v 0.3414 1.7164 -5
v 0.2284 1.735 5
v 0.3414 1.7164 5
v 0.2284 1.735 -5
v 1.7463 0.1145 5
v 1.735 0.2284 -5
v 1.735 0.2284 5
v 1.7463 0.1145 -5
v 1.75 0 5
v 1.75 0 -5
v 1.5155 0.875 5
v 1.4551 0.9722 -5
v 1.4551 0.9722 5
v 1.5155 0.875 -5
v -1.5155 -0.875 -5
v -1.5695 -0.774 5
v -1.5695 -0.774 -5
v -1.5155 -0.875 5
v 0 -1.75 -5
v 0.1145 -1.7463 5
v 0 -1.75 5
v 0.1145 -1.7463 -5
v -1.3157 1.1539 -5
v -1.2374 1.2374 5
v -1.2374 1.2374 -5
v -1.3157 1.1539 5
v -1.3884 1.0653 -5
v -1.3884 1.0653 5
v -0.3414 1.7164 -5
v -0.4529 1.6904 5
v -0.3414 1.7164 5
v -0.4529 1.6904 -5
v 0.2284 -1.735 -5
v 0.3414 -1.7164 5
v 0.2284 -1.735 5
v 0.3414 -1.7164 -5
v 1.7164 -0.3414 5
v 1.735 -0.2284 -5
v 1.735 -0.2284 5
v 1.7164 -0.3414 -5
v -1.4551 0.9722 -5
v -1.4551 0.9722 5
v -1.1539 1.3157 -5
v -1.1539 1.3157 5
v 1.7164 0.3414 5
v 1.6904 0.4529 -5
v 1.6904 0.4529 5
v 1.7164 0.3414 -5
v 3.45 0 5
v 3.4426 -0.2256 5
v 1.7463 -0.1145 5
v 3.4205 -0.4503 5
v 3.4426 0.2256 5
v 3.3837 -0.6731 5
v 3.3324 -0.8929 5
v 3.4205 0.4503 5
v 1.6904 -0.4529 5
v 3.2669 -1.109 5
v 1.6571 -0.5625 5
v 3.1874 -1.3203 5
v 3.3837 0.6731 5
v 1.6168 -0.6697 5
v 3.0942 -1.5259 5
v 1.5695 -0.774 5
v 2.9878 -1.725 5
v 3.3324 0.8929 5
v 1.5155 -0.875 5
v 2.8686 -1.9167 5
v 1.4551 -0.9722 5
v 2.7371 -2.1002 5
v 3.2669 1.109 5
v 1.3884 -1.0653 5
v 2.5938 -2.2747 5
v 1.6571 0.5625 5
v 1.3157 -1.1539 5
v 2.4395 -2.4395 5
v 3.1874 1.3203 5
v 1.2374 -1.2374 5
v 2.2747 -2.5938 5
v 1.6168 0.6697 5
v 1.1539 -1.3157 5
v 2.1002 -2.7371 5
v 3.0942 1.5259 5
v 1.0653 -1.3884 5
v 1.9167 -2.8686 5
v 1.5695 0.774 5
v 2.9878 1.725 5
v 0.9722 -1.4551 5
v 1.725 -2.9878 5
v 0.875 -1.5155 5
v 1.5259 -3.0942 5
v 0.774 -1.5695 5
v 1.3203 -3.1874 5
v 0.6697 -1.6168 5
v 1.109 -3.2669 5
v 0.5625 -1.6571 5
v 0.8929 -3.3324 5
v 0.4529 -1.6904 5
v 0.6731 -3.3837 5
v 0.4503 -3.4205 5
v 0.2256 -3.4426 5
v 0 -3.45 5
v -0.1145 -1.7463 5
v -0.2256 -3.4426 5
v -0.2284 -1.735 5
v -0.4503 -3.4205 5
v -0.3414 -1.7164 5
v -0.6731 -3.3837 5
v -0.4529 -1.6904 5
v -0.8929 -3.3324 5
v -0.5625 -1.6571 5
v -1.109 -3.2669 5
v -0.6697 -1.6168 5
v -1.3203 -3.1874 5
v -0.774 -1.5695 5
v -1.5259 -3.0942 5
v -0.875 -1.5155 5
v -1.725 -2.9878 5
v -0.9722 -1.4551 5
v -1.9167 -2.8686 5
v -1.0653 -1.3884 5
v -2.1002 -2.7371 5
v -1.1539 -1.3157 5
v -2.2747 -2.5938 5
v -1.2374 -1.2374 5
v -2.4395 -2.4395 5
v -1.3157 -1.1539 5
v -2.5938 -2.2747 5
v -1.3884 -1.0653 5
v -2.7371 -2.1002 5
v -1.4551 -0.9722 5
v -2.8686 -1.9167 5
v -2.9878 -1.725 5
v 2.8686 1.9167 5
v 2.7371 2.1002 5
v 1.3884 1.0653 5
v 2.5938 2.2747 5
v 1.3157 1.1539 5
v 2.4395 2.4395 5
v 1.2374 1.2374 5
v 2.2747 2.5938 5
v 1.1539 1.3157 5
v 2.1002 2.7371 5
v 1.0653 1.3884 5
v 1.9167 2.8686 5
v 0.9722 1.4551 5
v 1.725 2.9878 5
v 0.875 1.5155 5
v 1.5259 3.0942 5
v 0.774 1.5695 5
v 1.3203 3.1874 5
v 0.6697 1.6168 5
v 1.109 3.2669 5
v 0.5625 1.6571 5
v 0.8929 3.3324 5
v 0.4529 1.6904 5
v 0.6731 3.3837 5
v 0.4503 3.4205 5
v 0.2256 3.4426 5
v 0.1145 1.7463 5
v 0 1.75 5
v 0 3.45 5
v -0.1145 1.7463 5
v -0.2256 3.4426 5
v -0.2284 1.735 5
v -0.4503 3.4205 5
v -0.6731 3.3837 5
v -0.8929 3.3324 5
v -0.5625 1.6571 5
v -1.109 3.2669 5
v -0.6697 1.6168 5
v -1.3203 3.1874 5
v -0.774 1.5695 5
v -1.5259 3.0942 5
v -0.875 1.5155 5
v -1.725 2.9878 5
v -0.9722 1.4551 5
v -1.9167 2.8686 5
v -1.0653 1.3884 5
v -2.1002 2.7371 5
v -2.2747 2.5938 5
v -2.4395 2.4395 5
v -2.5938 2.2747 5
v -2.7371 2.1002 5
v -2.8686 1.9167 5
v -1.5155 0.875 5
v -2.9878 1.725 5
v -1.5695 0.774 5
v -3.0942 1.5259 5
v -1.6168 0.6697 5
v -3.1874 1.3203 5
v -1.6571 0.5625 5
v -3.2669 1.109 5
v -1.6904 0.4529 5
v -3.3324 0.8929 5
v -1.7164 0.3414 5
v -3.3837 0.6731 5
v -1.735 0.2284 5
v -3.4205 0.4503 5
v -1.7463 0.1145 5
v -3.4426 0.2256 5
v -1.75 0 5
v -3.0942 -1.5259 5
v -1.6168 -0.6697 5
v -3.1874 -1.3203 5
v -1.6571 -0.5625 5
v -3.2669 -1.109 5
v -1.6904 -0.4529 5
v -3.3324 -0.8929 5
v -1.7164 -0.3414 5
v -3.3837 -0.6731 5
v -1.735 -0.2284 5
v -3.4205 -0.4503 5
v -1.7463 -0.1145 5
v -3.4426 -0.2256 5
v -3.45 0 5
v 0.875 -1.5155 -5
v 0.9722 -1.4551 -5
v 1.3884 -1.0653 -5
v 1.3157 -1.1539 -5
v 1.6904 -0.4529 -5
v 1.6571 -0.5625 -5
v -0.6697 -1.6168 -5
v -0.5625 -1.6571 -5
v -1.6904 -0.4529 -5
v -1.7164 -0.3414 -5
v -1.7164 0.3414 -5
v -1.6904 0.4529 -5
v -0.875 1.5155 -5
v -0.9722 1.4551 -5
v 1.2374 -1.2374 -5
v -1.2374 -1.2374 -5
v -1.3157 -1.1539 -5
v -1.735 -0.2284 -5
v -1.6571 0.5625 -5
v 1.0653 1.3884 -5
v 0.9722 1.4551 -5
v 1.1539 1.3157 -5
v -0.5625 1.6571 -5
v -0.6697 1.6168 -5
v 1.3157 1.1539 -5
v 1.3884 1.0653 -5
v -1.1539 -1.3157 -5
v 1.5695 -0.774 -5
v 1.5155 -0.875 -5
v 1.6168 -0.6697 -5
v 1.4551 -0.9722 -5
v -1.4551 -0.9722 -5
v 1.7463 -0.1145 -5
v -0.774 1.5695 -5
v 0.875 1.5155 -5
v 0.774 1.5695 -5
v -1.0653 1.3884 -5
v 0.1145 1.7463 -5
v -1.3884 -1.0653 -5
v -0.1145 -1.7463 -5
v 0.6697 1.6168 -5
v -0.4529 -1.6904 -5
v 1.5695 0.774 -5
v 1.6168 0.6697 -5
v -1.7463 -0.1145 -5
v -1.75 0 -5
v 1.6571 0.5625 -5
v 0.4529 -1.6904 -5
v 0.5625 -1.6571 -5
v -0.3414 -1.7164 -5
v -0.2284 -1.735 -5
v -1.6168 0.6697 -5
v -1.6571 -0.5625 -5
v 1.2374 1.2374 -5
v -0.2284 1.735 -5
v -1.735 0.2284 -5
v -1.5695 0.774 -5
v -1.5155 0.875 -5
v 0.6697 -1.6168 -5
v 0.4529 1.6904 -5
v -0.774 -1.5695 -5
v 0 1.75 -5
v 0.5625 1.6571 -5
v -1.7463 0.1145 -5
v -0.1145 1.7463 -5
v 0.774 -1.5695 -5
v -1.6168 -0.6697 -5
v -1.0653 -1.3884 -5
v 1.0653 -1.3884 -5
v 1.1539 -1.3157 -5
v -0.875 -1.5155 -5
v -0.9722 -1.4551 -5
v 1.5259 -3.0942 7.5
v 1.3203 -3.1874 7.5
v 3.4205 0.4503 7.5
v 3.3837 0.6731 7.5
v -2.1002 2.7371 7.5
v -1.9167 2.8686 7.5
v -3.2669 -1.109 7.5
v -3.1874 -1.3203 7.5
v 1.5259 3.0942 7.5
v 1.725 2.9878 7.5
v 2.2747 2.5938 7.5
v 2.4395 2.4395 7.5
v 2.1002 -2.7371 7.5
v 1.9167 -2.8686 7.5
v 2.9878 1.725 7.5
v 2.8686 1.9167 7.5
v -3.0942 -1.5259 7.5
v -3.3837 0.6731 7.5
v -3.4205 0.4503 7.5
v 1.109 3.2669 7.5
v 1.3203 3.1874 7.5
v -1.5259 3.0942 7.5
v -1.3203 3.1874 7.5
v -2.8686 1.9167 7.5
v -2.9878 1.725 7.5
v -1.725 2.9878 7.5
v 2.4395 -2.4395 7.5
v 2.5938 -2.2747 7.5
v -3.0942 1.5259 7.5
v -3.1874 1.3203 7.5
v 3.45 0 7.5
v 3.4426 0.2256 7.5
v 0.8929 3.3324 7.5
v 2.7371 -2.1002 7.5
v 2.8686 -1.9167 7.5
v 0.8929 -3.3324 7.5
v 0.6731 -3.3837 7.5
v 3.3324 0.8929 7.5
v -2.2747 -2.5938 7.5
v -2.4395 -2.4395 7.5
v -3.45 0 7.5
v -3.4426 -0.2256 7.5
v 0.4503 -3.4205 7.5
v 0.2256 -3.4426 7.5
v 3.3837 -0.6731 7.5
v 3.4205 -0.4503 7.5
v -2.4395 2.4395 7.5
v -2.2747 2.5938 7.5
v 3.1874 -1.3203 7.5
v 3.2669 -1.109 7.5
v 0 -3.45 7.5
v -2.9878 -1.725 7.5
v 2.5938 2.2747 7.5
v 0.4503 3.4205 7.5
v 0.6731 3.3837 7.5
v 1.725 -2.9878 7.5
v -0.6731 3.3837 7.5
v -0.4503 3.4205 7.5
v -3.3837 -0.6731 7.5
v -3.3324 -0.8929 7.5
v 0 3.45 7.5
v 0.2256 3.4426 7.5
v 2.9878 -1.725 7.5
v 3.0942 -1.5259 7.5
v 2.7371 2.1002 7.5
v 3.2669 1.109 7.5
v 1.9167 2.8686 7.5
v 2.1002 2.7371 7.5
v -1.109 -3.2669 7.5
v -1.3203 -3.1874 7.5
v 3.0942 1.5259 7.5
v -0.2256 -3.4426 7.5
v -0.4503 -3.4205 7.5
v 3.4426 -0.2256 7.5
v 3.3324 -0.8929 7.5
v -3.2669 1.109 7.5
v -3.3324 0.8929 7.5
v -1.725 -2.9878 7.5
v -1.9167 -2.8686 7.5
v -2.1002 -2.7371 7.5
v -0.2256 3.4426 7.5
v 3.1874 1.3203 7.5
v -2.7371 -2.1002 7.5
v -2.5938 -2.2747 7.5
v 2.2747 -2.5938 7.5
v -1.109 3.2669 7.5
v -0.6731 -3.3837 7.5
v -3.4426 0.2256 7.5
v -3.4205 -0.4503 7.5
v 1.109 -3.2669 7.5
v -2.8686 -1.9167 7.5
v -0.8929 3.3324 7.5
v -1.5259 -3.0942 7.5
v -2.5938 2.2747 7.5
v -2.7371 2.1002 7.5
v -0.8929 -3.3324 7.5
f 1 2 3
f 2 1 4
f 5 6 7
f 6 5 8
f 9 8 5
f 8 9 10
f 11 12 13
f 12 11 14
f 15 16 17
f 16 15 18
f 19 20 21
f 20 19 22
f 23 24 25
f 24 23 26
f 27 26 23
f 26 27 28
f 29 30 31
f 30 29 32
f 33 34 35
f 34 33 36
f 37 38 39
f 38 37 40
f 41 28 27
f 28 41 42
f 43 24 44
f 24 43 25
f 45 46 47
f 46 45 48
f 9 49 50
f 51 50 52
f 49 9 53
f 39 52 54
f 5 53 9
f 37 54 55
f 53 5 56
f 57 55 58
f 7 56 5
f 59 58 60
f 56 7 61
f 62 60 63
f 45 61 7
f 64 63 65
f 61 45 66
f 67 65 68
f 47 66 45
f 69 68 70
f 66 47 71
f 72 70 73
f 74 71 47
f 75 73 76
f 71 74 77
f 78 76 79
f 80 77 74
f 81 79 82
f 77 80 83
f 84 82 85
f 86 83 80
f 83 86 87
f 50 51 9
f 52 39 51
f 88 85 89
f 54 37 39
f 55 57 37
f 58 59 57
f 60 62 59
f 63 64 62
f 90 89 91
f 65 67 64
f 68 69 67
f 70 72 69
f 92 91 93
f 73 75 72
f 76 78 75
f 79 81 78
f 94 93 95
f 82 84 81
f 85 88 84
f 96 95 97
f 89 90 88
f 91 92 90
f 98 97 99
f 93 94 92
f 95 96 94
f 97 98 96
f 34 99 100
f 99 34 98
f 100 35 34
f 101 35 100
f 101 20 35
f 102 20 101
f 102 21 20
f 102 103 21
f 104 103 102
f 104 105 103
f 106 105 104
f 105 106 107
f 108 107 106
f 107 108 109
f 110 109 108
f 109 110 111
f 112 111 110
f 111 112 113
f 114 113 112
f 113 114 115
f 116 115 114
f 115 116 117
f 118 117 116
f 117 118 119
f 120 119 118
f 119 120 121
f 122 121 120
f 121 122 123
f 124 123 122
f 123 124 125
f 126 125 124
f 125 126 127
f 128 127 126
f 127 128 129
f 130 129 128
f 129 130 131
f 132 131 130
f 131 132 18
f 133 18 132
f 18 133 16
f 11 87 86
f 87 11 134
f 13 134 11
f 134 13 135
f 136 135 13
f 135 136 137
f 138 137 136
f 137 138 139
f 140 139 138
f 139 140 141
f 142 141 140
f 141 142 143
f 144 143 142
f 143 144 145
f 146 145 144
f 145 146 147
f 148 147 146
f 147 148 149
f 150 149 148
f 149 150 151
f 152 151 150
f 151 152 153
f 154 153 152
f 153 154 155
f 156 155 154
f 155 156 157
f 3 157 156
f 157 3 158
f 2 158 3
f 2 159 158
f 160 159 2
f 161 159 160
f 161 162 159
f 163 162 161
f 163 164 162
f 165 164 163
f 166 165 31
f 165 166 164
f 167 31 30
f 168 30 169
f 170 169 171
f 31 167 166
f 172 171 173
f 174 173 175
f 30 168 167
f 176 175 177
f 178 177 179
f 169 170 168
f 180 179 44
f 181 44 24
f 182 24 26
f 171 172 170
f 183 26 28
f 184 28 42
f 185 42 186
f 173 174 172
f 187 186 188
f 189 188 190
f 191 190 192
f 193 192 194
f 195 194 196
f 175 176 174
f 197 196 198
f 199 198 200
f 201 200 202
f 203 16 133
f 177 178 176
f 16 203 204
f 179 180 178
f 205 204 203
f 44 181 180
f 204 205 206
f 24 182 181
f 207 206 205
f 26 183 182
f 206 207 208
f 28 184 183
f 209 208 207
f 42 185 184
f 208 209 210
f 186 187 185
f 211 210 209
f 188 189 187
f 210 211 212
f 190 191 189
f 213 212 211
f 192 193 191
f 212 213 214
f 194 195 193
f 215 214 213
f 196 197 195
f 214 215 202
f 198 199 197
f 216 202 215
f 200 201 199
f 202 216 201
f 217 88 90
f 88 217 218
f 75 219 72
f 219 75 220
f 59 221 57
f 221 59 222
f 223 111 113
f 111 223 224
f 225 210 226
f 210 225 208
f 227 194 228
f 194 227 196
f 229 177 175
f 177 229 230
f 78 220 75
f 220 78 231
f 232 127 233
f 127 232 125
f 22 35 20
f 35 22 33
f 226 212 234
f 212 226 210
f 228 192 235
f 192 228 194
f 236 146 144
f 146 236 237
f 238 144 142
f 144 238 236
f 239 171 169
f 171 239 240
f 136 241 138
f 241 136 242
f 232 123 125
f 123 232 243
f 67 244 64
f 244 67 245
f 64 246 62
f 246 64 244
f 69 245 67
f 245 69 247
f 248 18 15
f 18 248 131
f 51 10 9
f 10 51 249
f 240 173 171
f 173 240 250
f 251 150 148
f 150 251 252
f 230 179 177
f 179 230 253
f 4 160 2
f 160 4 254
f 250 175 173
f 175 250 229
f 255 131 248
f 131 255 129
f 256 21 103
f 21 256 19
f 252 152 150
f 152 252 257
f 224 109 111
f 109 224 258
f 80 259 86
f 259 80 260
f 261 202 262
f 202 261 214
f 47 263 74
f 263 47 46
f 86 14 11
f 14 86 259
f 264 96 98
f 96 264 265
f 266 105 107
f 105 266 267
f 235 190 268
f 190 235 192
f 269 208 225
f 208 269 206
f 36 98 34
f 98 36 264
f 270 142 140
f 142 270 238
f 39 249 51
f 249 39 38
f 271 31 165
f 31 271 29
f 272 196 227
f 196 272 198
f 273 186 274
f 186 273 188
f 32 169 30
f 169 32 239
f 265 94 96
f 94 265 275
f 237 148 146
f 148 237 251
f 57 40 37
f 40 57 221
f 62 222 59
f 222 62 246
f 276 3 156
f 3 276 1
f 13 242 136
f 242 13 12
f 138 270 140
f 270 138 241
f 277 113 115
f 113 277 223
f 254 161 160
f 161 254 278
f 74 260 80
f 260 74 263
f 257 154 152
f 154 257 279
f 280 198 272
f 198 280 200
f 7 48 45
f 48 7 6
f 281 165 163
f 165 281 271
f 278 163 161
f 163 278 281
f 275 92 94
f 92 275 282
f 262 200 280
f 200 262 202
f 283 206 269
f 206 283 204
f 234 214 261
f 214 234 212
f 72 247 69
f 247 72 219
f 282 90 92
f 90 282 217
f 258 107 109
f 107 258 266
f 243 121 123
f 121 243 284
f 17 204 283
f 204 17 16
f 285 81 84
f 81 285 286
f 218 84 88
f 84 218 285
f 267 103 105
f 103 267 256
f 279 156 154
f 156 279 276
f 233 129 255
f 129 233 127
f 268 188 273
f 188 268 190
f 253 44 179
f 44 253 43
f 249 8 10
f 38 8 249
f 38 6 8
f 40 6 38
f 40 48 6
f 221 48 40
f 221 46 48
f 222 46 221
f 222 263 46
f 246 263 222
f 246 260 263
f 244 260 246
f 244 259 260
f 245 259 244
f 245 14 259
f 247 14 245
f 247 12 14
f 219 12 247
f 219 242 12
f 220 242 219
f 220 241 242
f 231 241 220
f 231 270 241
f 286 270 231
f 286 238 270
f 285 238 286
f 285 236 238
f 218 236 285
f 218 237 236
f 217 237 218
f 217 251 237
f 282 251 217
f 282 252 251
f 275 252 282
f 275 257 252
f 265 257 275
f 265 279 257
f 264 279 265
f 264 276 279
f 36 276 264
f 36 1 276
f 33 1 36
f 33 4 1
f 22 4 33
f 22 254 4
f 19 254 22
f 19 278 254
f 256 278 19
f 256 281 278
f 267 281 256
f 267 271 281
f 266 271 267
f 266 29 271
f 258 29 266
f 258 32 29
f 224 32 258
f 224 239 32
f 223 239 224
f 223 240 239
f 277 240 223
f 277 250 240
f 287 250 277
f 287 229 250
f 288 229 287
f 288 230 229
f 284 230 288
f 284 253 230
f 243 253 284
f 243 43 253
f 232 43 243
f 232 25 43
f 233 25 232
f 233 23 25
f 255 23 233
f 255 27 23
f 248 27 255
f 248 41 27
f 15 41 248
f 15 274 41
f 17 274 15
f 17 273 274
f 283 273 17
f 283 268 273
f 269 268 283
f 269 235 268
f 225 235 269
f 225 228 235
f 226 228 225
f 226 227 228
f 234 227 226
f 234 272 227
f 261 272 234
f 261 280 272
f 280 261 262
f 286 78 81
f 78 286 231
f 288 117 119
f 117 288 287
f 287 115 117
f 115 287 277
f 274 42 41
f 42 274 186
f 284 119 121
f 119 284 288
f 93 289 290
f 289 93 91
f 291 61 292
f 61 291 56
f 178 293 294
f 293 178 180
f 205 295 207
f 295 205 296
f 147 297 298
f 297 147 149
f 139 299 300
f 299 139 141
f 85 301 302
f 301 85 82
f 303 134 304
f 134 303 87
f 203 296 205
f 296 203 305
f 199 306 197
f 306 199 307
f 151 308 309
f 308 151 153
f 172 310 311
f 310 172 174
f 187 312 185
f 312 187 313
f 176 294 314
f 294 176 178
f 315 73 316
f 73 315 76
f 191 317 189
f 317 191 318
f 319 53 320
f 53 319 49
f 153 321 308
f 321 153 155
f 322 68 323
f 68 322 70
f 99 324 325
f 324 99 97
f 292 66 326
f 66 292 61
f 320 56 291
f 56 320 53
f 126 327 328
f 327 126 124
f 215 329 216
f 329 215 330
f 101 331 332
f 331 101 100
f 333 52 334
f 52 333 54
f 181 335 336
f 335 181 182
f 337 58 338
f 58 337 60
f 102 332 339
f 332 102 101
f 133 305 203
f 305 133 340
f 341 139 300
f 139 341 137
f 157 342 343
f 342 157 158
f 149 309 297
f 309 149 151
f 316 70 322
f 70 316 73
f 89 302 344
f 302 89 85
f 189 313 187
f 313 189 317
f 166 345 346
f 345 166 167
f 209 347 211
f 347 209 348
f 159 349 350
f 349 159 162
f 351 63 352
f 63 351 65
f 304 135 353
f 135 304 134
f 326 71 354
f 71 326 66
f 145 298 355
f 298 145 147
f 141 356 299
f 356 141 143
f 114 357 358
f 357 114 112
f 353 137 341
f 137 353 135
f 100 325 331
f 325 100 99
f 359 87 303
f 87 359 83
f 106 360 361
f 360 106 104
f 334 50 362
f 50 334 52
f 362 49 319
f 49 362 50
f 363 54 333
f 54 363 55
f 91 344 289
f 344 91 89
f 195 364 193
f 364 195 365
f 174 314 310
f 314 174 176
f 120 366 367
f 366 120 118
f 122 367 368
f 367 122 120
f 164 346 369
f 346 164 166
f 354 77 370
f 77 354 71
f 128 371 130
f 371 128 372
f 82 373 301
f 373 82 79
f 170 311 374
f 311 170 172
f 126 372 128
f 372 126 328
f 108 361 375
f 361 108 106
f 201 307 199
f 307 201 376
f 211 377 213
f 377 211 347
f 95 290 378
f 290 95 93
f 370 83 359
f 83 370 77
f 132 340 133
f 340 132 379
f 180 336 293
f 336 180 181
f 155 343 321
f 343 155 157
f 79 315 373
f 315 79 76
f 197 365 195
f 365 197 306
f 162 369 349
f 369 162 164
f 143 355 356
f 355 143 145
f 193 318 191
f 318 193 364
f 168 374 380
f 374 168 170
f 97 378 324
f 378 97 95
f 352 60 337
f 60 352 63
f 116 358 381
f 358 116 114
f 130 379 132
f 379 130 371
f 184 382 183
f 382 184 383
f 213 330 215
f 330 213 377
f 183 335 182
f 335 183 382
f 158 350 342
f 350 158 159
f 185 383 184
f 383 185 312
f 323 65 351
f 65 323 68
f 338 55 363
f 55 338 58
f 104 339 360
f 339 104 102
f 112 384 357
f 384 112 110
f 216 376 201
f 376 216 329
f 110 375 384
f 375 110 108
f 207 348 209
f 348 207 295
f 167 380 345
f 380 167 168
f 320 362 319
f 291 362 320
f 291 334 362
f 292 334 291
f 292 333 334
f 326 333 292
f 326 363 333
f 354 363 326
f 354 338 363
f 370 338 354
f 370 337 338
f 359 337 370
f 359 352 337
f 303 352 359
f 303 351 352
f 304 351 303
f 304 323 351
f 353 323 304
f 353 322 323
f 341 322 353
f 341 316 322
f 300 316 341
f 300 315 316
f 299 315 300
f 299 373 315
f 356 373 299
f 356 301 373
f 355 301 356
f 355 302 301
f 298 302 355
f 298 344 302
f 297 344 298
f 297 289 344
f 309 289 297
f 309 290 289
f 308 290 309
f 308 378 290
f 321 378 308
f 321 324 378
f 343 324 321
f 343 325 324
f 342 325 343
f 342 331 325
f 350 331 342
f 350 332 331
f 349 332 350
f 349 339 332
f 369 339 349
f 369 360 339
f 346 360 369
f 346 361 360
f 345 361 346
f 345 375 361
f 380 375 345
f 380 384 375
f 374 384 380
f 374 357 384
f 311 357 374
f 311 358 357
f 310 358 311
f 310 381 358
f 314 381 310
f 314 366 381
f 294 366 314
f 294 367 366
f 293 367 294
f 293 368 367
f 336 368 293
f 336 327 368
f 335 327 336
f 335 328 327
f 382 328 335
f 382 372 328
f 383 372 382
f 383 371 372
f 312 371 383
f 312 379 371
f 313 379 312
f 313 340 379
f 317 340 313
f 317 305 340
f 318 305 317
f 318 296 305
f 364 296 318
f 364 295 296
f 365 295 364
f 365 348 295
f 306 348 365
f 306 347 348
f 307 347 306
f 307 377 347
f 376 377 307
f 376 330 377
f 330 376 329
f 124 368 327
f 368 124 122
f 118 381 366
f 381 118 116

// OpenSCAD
$fn=96;

module pan_head_screw(shaft_d=3.5, length=10, head_d=6.9, head_h=2.5) {
    union() {
        translate([0,0,-length/2])
            cylinder(h=length, d=shaft_d);

        translate([0,0,length/2])
            cylinder(h=head_h, d=head_d);
    }
}

pan_head_screw();
